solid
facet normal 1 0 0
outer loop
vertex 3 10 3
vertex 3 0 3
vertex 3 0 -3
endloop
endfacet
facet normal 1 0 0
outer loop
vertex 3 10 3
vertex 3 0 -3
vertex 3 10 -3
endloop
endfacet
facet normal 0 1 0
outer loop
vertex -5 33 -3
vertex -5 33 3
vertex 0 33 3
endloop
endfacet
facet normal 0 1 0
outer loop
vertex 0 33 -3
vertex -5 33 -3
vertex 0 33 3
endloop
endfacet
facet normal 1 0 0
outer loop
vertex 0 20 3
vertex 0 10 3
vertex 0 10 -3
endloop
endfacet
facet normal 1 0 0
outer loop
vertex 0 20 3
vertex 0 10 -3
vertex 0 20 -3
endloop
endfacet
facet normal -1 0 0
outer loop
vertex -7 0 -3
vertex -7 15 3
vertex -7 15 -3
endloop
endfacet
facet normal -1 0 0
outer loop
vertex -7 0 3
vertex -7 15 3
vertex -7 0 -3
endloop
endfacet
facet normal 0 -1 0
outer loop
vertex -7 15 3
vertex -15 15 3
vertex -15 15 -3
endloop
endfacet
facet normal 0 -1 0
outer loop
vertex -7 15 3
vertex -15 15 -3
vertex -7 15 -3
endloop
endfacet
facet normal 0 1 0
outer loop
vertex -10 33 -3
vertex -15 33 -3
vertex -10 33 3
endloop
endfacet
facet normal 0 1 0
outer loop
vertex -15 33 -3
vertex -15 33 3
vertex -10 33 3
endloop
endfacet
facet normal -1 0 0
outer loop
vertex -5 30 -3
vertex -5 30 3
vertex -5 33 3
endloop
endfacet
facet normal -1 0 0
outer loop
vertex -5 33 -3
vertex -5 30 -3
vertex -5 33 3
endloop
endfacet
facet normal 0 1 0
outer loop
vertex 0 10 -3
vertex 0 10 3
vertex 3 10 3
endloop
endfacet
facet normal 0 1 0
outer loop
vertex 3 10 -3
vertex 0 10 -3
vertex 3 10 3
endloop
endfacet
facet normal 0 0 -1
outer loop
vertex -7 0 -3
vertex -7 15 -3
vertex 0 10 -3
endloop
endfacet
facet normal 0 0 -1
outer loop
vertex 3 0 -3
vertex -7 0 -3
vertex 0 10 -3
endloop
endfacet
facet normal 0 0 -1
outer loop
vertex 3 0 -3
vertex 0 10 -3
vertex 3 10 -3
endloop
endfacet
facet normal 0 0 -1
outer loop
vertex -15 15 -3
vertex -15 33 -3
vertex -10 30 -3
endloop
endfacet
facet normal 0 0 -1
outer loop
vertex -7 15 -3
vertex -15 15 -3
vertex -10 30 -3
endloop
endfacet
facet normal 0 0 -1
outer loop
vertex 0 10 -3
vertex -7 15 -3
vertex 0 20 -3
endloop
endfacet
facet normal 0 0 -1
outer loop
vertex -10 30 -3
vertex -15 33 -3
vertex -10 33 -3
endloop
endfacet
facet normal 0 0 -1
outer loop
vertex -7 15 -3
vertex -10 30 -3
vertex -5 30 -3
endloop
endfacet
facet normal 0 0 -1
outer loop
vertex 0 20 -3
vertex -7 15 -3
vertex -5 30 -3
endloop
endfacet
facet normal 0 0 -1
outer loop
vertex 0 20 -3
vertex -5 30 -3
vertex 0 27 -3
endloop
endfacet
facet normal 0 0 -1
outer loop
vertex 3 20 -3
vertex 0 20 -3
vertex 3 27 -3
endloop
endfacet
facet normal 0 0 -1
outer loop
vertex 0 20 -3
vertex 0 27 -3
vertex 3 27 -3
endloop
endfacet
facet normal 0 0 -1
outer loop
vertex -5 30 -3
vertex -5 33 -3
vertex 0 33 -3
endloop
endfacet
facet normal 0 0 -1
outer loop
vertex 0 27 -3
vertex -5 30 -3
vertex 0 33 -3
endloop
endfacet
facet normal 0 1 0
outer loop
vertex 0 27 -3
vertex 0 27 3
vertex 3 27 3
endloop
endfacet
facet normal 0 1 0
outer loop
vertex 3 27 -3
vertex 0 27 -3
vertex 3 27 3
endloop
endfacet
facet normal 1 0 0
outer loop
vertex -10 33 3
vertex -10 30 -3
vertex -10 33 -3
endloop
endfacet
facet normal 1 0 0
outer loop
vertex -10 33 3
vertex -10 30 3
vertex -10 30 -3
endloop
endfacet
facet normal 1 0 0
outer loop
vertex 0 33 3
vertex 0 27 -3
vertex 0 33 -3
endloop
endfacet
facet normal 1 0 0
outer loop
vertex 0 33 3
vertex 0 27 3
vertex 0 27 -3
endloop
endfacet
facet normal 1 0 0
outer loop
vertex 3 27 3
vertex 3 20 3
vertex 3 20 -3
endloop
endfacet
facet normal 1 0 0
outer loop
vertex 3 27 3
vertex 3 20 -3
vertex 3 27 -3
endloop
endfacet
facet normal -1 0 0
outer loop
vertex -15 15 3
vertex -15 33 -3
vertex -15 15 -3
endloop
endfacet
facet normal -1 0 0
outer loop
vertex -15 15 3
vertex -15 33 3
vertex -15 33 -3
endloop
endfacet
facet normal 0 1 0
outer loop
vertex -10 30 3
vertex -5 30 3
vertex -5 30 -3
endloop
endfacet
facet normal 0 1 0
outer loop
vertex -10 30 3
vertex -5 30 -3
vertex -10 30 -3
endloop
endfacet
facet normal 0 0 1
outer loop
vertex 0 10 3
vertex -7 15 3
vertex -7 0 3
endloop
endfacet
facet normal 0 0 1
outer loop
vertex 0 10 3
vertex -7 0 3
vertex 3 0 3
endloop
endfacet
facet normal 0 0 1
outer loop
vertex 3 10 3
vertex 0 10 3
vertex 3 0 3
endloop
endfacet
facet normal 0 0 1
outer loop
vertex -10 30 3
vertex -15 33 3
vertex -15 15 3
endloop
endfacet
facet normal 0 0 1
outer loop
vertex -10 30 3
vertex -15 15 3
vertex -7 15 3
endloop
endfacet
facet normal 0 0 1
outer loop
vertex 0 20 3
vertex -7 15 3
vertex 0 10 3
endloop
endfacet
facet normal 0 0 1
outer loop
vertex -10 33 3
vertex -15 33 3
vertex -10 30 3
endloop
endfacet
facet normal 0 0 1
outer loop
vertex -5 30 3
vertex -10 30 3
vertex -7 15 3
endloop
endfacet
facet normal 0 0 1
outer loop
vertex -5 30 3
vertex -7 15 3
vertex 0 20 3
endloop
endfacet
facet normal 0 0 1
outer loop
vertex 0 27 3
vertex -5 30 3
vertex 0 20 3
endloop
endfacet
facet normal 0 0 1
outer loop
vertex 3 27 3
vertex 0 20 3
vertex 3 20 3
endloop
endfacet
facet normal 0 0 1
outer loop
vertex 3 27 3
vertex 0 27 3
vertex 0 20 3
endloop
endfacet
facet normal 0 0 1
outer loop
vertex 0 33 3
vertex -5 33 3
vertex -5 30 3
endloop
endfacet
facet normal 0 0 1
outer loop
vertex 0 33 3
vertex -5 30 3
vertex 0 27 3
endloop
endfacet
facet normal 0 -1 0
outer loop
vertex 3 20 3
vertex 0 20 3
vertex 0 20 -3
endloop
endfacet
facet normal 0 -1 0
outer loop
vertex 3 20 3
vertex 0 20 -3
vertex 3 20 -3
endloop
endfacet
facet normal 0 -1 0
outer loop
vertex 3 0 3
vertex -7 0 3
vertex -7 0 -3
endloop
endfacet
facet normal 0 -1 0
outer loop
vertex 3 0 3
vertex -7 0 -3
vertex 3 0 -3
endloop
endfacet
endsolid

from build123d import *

# Parameters (mm, degrees)
BOSS_EXTRU_1_DEPTH      = 3
ESQUISSE2_W             = 3
ESQUISSE2_H             = 3
ENL_V_MAT_EXTRU_1_DEPTH = 6


with BuildPart() as part:
    # Esquisse1 → Boss.-Extru.1 (new, symmetric)
    with BuildSketch(Plane.XY):
        Polygon((-7, 0), (3, 0), (3, 10), (0, 10), (0, 20), (3, 20), (3, 30), (0, 30), (0, 33), (-5, 33), (-5, 30), (-10, 30), (-10, 33), (-15, 33), (-15, 15), (-7, 15), align=None)
    extrude(amount=BOSS_EXTRU_1_DEPTH, both=True)

    # Esquisse2 → Enlèv. mat.-Extru.1 (cut)
    with BuildSketch(Plane.XY.offset(3)):
        with Locations((1.5, 28.5)):
            Rectangle(ESQUISSE2_W, ESQUISSE2_H)
    extrude(amount=-ENL_V_MAT_EXTRU_1_DEPTH, mode=Mode.SUBTRACT)


solid = part.part
